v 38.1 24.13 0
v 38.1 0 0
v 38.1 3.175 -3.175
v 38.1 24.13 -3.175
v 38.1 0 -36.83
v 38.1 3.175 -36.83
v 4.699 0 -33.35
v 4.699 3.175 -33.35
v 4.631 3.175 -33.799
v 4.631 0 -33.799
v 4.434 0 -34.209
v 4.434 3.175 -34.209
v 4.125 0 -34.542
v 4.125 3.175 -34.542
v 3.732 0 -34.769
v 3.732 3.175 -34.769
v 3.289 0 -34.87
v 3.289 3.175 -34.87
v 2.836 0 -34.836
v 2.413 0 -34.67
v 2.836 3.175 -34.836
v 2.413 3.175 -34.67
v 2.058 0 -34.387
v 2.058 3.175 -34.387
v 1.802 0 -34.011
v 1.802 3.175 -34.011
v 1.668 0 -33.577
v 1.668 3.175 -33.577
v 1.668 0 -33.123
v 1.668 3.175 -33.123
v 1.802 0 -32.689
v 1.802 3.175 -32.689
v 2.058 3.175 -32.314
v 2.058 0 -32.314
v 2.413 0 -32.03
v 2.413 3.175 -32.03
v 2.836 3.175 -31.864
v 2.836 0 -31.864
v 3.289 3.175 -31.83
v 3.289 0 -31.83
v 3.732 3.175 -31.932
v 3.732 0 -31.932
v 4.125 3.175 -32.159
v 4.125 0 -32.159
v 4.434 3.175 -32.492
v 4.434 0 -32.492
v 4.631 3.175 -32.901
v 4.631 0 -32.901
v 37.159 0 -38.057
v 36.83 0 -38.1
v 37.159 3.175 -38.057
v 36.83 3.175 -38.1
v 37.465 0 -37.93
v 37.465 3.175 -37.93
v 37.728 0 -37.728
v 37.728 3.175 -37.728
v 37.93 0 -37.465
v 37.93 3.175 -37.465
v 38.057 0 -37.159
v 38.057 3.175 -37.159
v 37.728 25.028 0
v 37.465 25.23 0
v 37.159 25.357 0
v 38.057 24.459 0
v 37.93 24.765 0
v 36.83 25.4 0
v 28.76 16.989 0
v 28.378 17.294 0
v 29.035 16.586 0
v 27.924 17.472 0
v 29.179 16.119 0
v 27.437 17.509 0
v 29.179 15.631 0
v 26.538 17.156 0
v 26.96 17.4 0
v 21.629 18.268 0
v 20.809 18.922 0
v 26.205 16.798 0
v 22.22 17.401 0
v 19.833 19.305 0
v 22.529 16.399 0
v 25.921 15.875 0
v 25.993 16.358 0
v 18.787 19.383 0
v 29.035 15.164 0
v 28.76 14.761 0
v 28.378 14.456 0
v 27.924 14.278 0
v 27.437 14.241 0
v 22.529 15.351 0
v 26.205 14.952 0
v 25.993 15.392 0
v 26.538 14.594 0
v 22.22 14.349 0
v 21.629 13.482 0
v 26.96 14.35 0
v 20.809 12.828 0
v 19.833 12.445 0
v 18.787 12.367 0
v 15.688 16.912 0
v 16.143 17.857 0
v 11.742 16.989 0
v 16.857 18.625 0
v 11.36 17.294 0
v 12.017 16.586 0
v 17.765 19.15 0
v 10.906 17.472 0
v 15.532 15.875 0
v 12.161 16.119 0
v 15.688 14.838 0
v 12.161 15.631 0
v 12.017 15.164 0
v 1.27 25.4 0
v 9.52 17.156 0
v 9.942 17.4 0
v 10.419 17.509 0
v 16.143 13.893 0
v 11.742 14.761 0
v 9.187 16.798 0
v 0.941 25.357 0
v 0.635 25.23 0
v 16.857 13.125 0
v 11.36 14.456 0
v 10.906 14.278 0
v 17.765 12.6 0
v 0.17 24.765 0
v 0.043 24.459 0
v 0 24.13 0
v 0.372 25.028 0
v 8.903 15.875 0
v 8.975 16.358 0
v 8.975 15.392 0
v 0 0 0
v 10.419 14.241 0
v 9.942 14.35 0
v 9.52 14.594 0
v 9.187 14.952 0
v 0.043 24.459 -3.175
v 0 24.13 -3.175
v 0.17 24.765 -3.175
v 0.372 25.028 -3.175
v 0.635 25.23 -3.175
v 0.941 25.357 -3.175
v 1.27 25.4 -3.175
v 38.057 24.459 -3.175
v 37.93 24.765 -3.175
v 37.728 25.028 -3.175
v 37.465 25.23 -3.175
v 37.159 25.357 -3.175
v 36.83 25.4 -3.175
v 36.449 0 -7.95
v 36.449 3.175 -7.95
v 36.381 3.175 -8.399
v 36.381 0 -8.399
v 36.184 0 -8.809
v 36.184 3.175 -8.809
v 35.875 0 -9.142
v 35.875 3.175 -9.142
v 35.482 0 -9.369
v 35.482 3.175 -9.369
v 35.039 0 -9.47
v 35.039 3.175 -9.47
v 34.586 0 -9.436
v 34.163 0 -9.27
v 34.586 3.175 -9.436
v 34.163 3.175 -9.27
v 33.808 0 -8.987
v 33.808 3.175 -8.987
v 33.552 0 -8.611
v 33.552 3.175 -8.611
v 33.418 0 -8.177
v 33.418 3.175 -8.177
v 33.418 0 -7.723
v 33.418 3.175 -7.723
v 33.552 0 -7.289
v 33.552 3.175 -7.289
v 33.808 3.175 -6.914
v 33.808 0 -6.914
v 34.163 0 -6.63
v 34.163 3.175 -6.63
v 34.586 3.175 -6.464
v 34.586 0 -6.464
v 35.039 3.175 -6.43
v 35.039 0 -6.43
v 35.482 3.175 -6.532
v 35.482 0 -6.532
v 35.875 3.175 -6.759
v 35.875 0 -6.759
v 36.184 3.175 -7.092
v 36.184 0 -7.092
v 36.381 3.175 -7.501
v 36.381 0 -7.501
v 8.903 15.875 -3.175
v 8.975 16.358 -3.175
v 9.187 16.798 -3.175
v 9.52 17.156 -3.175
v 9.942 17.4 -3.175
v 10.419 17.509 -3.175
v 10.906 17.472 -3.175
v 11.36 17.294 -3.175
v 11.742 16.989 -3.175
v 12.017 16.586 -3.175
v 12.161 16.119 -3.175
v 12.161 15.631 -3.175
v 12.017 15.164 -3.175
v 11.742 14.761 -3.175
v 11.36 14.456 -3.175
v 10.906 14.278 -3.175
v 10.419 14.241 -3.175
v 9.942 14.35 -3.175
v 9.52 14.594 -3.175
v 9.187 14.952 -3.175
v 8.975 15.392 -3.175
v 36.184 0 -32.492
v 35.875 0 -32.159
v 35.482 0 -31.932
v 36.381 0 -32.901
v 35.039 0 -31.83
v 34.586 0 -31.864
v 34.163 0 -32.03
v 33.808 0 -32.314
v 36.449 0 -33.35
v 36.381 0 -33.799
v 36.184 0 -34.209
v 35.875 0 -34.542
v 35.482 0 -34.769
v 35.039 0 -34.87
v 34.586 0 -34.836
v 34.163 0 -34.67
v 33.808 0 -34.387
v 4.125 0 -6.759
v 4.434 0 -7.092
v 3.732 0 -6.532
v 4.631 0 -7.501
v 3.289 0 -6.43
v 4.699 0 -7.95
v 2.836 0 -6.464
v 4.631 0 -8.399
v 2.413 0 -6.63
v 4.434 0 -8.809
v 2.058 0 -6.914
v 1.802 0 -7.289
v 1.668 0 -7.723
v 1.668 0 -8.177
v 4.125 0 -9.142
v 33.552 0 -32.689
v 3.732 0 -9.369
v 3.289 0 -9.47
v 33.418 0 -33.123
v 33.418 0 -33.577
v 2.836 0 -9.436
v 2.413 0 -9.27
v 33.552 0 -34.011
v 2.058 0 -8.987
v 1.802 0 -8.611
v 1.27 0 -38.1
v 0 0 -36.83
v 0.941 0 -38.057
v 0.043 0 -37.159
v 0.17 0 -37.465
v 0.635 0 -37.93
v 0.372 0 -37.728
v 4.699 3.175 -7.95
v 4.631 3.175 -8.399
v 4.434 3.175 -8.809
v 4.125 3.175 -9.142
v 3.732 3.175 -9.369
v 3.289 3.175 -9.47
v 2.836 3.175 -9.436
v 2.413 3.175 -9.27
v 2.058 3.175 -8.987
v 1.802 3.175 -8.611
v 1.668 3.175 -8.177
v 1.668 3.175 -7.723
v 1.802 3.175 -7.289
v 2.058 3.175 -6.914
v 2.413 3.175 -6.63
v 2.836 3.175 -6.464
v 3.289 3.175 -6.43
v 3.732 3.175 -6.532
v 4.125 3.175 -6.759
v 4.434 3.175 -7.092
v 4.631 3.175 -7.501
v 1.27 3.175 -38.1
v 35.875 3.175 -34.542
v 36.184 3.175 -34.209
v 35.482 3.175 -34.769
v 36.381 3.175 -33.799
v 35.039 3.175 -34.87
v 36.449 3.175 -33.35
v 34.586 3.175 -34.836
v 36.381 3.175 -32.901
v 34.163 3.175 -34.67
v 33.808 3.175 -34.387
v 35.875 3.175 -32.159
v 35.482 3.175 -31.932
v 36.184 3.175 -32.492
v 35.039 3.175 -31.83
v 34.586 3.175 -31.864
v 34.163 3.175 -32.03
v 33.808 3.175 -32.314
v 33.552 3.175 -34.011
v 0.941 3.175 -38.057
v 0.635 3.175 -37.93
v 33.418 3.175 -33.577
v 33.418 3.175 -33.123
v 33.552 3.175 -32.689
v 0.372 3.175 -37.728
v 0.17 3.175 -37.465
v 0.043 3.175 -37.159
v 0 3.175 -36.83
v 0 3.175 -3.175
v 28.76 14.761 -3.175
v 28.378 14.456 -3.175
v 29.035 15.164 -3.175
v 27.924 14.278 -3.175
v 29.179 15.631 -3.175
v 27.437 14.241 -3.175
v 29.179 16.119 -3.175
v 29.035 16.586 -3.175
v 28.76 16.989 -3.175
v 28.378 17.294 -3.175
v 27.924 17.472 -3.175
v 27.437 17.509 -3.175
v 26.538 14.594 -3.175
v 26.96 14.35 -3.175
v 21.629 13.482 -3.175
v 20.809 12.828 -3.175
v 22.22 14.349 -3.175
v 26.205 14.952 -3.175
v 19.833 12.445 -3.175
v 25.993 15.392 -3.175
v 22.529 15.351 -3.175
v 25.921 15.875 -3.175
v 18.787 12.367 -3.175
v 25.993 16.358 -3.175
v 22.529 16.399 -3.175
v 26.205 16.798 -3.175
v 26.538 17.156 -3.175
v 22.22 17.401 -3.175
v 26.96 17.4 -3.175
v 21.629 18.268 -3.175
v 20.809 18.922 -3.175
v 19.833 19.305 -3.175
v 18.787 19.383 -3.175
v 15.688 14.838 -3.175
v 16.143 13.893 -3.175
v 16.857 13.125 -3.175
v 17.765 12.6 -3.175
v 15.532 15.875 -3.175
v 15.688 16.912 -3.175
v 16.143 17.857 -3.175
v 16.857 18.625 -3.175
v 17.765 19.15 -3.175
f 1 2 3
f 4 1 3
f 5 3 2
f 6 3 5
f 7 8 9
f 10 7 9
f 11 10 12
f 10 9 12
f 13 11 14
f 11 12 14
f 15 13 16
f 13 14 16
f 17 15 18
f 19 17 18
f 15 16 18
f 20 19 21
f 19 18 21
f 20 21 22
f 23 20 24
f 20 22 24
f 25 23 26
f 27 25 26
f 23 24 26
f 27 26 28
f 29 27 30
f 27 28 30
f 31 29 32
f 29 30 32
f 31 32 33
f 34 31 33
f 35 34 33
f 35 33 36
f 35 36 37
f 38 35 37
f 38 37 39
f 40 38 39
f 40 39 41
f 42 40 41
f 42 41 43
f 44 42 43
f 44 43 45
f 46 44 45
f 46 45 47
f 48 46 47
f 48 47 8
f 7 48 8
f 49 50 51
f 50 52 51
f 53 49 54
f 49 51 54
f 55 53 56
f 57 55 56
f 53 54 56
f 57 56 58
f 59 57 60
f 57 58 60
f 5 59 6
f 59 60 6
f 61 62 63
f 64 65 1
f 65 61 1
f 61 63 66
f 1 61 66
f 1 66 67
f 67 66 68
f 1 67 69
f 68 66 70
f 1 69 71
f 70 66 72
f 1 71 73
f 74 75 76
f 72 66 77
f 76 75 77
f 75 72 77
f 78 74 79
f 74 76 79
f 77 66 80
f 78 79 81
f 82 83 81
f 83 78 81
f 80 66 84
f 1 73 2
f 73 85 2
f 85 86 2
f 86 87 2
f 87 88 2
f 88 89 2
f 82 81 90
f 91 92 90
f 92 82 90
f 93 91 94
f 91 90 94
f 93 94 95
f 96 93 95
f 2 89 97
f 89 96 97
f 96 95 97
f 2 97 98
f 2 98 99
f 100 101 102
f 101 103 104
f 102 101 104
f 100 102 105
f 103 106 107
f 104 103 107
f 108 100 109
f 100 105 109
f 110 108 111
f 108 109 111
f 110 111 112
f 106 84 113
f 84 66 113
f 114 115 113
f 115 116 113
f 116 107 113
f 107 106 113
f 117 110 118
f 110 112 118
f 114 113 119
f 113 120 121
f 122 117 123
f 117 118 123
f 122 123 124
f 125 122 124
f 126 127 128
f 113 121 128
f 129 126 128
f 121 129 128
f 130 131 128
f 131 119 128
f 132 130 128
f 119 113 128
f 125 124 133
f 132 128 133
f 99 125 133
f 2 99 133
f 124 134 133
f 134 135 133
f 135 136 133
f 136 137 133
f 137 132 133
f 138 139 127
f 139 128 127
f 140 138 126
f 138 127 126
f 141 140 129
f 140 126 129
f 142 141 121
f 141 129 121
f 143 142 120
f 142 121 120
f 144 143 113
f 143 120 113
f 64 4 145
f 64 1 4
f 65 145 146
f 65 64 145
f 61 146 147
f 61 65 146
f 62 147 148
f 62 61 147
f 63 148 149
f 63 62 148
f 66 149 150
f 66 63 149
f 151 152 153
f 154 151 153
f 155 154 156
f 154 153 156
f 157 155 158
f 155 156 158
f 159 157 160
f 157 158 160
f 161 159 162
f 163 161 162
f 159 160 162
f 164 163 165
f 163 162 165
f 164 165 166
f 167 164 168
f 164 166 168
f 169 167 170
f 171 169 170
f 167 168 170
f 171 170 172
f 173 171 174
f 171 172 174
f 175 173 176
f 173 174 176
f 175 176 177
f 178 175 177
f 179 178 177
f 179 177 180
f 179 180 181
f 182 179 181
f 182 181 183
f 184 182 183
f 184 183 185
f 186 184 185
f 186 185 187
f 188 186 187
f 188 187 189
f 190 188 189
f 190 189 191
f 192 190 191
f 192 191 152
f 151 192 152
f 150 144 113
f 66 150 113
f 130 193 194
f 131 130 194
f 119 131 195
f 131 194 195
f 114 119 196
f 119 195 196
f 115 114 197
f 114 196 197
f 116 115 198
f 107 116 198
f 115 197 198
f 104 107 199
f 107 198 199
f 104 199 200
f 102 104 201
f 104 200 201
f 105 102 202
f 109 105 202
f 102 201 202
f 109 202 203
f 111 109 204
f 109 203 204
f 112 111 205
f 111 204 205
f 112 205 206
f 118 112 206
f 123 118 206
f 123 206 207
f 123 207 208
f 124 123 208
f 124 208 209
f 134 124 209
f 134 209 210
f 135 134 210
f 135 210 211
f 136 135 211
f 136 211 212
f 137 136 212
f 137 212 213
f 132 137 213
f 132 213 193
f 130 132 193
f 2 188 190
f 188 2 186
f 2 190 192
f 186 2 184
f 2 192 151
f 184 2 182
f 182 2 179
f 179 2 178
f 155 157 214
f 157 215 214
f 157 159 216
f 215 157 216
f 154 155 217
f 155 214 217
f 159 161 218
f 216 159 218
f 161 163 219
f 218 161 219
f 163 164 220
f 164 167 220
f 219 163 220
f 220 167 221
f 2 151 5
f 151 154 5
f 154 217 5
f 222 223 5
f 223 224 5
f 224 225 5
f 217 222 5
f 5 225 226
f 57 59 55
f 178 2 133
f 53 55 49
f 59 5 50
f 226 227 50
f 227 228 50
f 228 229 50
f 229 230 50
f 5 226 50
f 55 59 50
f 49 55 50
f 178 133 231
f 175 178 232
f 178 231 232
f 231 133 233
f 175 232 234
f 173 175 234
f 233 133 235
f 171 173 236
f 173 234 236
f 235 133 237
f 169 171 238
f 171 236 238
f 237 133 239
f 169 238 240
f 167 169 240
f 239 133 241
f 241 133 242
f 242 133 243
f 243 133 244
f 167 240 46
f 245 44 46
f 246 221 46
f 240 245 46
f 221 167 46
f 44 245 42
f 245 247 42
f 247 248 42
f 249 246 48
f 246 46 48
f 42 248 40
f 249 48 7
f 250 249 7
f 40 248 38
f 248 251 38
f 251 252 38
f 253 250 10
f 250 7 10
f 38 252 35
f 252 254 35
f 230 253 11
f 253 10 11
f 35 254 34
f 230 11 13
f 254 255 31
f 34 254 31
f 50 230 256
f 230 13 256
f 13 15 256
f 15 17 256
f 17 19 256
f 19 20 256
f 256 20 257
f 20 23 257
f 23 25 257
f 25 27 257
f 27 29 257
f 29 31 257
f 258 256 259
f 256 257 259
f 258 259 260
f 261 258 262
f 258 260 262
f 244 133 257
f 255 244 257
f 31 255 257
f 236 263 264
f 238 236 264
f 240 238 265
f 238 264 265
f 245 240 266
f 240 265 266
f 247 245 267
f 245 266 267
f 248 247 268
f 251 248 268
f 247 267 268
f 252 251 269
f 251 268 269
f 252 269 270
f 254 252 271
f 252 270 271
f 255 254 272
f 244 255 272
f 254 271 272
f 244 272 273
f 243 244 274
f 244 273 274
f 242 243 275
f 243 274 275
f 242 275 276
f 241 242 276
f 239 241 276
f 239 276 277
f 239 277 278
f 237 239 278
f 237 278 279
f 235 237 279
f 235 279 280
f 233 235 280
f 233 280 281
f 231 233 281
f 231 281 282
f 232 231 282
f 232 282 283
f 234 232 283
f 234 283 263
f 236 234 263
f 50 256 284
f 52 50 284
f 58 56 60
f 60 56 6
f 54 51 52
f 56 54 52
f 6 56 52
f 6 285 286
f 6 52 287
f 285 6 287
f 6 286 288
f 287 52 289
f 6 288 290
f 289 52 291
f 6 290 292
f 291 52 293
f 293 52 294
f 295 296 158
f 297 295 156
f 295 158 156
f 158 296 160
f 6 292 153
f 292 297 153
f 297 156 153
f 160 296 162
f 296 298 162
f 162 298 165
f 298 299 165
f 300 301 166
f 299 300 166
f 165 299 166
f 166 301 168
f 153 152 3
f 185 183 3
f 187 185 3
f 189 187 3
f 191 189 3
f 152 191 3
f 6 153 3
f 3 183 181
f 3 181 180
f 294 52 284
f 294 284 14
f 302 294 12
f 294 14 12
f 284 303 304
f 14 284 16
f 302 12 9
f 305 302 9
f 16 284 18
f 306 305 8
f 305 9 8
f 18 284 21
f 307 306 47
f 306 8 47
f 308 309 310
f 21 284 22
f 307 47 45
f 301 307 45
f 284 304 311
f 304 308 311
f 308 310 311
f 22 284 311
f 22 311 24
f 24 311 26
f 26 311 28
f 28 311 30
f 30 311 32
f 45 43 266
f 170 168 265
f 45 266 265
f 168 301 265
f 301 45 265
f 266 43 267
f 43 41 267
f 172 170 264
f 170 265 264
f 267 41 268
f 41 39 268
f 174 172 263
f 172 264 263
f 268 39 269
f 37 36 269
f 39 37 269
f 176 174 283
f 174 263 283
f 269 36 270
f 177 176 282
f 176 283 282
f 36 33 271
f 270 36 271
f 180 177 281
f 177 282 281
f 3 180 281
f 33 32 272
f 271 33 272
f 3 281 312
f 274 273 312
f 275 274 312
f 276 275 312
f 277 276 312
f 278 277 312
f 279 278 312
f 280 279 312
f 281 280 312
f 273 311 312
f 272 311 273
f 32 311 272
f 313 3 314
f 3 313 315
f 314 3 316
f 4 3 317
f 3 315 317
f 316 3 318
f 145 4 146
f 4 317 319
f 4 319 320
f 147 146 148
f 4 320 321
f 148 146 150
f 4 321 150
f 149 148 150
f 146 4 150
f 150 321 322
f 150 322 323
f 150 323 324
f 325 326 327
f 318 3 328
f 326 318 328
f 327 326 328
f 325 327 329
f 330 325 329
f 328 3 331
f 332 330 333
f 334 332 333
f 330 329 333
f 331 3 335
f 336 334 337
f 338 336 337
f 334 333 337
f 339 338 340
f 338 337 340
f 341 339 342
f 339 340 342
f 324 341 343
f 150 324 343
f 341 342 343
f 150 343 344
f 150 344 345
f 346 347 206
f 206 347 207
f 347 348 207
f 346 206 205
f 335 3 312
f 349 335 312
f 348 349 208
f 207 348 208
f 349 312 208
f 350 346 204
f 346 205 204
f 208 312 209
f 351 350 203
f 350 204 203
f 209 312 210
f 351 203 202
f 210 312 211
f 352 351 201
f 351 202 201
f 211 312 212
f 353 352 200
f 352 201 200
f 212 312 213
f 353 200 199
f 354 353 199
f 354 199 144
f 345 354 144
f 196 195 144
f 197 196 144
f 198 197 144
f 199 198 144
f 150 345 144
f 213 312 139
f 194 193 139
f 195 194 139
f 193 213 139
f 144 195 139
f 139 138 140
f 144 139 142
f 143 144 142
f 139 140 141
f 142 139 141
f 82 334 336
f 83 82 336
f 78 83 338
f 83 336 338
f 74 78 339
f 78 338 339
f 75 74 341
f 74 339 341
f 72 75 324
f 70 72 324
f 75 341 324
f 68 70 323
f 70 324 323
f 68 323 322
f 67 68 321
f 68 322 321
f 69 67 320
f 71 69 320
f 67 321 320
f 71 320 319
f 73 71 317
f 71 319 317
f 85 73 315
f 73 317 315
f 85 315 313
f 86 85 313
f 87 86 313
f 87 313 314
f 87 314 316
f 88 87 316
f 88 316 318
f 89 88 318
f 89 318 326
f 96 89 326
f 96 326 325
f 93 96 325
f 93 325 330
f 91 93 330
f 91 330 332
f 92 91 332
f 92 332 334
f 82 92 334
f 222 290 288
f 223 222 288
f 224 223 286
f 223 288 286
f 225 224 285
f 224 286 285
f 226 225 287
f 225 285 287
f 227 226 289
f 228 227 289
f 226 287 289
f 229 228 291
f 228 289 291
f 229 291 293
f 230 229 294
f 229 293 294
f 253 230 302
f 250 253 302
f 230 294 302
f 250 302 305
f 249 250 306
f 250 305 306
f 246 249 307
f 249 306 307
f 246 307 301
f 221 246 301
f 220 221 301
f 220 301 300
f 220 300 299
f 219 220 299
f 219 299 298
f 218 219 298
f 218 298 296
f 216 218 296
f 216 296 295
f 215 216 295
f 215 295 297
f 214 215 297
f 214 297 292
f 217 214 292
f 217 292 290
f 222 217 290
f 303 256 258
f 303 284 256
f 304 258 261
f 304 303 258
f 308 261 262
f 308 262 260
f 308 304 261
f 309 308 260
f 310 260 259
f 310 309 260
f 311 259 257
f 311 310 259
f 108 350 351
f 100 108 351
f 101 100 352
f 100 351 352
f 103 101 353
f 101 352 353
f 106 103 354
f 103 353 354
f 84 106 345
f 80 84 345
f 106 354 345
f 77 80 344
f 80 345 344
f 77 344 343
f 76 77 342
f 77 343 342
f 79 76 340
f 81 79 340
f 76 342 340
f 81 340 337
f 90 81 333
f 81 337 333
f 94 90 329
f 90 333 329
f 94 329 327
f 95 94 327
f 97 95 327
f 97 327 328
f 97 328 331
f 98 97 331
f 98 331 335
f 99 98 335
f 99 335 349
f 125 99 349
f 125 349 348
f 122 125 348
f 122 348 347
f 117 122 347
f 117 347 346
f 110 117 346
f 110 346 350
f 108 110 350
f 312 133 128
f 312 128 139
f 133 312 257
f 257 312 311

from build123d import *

# Parameters (mm, degrees)
BOSS_EXTRUDE1_DEPTH = 38.1
SKETCH3_R           = 3.5179
SKETCH3_R_2         = 1.6383
CUT_EXTRUDE1_DEPTH  = 4.175
FILLET1_R           = 1.27
SKETCH4_R           = 1.524
CUT_EXTRUDE2_DEPTH  = 4.175


with BuildPart() as part:
    # Sketch2 → Boss-Extrude1 (new body)
    with BuildSketch(Plane(origin=(0, 0, 0), x_dir=(0, 0, -1), z_dir=(1, 0, 0))):
        Polygon((0, 0), (38.1, 0), (38.1, 3.175), (3.175, 3.175), (3.175, 25.4), (0, 25.4), align=None)
    extrude(amount=BOSS_EXTRUDE1_DEPTH)

    # Sketch3 → Cut-Extrude1 (cut, through all)
    with BuildSketch(Plane(origin=(0, 0, -3.175), x_dir=(-1, 0, 0), z_dir=(0, 0, -1))):
        with Locations((-19.05, 15.875)):
            Circle(SKETCH3_R)
        with Locations((-10.541, 15.875)):
            Circle(SKETCH3_R_2)
        with Locations((-27.559, 15.875)):
            Circle(SKETCH3_R_2)
    extrude(amount=-CUT_EXTRUDE1_DEPTH, mode=Mode.SUBTRACT)

    # Fillet1
    fillet1_edges = [part.edges().sort_by_distance(p)[0] for p in [
        (38.1, 1.5875, -38.1),
        (38.1, 25.4, -1.5875),
        (0, 25.4, -1.5875),
        (0, 1.5875, -38.1),
    ]]
    fillet(fillet1_edges, radius=FILLET1_R)

    # Sketch4 → Cut-Extrude2 (cut, through all)
    with BuildSketch(Plane(origin=(0, 3.175, 0), x_dir=(1, 0, 0), z_dir=(0, 1, 0))):
        with Locations((3.175, 7.9502)):
            Circle(SKETCH4_R)
        with Locations((3.175, 33.3502)):
            Circle(SKETCH4_R)
        with Locations((34.925, 33.3502)):
            Circle(SKETCH4_R)
        with Locations((34.925, 7.9502)):
            Circle(SKETCH4_R)
    extrude(amount=-CUT_EXTRUDE2_DEPTH, mode=Mode.SUBTRACT)


solid = part.part
